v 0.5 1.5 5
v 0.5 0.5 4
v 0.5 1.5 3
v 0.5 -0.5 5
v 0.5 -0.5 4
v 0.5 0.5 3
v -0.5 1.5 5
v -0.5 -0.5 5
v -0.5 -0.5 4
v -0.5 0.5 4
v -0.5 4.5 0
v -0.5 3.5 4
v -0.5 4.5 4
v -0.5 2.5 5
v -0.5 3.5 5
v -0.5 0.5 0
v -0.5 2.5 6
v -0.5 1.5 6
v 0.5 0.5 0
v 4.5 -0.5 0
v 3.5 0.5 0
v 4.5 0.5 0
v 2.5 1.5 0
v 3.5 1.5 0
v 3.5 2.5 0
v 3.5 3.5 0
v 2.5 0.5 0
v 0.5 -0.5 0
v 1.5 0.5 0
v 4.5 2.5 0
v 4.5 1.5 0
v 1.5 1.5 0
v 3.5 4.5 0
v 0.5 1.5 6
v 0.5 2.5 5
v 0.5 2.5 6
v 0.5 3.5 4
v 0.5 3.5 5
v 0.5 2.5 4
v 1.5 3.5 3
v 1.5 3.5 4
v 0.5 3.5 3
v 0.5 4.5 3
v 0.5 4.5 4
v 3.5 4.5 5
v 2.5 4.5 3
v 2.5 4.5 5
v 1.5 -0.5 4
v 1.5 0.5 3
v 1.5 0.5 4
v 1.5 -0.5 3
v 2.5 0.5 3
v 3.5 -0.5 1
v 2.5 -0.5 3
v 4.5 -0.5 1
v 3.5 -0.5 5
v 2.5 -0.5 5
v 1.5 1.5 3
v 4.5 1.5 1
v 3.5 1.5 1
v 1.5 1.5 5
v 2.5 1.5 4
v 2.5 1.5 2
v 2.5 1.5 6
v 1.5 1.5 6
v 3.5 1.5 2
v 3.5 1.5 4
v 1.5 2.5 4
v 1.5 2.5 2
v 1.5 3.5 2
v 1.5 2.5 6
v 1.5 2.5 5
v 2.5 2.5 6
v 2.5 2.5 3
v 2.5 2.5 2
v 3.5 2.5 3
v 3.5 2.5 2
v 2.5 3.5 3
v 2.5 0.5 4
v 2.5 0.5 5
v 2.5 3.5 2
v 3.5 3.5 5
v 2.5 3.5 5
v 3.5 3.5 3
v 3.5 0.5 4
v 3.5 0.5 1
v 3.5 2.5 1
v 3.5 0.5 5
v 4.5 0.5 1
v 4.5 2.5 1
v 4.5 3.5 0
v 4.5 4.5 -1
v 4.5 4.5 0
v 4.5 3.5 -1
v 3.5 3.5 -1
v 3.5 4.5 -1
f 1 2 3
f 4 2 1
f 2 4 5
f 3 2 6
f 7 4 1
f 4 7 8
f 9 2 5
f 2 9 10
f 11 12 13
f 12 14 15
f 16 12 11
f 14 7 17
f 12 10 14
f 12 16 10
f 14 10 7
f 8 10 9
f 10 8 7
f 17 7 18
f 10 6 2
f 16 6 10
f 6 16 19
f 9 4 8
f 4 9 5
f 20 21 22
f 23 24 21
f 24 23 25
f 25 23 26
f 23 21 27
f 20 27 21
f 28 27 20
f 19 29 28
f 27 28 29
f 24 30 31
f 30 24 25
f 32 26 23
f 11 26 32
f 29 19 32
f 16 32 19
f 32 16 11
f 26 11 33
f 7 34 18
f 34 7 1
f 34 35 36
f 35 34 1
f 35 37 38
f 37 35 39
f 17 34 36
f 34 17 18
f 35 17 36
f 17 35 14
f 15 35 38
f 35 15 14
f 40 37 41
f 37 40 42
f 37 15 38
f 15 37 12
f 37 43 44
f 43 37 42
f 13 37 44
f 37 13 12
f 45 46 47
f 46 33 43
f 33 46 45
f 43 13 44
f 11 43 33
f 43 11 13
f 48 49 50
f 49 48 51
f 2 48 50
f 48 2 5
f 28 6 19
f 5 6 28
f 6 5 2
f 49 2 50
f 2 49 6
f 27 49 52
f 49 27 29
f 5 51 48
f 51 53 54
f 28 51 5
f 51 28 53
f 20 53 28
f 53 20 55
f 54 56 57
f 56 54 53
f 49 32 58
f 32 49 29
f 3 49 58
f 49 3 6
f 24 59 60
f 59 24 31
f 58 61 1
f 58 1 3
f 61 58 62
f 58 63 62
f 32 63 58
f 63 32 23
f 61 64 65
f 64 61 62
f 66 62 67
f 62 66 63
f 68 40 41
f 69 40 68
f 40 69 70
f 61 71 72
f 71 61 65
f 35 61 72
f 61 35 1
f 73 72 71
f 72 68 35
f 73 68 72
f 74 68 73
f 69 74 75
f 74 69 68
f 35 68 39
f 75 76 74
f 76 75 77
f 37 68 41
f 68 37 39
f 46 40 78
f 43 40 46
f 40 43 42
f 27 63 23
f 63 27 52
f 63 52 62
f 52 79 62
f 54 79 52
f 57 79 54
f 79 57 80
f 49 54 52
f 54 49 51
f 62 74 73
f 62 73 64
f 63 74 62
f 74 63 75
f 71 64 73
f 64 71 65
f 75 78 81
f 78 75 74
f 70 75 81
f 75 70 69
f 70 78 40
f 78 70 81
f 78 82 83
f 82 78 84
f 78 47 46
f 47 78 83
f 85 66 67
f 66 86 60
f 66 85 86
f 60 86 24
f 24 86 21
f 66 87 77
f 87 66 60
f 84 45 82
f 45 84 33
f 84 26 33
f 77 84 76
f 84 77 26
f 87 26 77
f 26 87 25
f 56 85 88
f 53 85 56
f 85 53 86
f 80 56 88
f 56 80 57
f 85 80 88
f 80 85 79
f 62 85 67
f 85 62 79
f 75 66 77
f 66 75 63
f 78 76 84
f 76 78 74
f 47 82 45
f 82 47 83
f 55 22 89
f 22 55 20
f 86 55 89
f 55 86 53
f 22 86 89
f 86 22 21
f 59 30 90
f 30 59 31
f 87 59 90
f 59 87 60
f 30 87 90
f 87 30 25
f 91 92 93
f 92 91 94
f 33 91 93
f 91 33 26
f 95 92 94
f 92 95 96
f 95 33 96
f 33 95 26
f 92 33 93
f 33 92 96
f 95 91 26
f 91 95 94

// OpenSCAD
union() {
    translate([0, 0, 4.5]) color([1, 0, 0]) cube([1, 1, 1], center=true);
    translate([0, 1, 2.5]) cube([1, 1, 5], center=true);
    translate([0, 2, 3.0]) cube([1, 1, 6], center=true);
    translate([0, 3, 2.5]) cube([1, 1, 5], center=true);
    translate([0, 4, 2.0]) cube([1, 1, 4], center=true);
    translate([1, 0, 2.0]) cube([1, 1, 4], center=true);
    translate([1, 1, 1.5]) cube([1, 1, 3], center=true);
    translate([1, 2, 2.5]) cube([1, 1, 5], center=true);
    translate([1, 3, 2.0]) cube([1, 1, 4], center=true);
    translate([1, 4, 1.5]) cube([1, 1, 3], center=true);
    translate([2, 0, 1.5]) cube([1, 1, 3], center=true);
    translate([2, 2, 3.0]) cube([1, 1, 6], center=true);
    translate([2, 3, 1.0]) cube([1, 1, 2], center=true);
    translate([2, 4, 1.5]) cube([1, 1, 3], center=true);
    translate([3, 0, 2.5]) cube([1, 1, 5], center=true);
    translate([3, 1, 2.0]) cube([1, 1, 4], center=true);
    translate([3, 2, 1.0]) cube([1, 1, 2], center=true);
    translate([3, 3, 1.5]) cube([1, 1, 3], center=true);
    translate([3, 4, 2.5]) cube([1, 1, 5], center=true);
    translate([4, 0, 0.5]) cube([1, 1, 1], center=true);
    translate([4, 2, 0.5]) cube([1, 1, 1], center=true);
    translate([4, 4, -0.5]) color([0, 0, 1]) cube([1, 1, 1], center=true);
}
